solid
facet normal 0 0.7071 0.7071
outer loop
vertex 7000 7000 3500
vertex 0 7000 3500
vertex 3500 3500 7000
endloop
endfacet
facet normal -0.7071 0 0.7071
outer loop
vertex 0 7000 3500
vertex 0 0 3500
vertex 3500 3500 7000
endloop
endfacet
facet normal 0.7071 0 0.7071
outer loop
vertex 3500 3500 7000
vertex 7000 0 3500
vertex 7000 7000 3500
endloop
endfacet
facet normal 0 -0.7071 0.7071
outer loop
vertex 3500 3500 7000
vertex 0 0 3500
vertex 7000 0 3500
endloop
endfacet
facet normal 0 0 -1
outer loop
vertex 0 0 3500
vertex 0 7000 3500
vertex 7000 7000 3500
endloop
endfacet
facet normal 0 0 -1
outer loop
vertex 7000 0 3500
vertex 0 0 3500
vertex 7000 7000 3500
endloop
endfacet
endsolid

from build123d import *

# Parameters (mm, degrees)
F0_W     = 7000
F0_H     = 7000
F1_DEPTH = 7000
F2_SIZE  = 3499.99999
F3_DEPTH = 3500


# Not quite as in the source:
# - a fillet or chamfer is up to 0.001 mm smaller than in the source, because OpenCascade refuses the exact size


with BuildPart() as f1:
    # F0 (on Top) → F1 (new body)
    with BuildSketch(Plane.XY):
        with Locations((3500, 3500)):
            Rectangle(F0_W, F0_H)
    extrude(amount=F1_DEPTH)

    # F2 (size 3500 in the source; OpenCascade refuses exactly that, so slightly less here)
    f2_edges = [f1.edges().sort_by_distance(p)[0] for p in [
        (3500, 0, 7000),
        (7000, 3500, 7000),
        (3500, 7000, 7000),
        (0, 3500, 7000),
    ]]
    chamfer(f2_edges, length=F2_SIZE)

    # F3 (cut): a face of the model
    f3_faces = [f1.faces().sort_by_distance(p)[0] for p in [
        (3500, 3500, 0),
    ]]
    extrude(f3_faces, amount=-F3_DEPTH, mode=Mode.SUBTRACT)


solid = f1.part
